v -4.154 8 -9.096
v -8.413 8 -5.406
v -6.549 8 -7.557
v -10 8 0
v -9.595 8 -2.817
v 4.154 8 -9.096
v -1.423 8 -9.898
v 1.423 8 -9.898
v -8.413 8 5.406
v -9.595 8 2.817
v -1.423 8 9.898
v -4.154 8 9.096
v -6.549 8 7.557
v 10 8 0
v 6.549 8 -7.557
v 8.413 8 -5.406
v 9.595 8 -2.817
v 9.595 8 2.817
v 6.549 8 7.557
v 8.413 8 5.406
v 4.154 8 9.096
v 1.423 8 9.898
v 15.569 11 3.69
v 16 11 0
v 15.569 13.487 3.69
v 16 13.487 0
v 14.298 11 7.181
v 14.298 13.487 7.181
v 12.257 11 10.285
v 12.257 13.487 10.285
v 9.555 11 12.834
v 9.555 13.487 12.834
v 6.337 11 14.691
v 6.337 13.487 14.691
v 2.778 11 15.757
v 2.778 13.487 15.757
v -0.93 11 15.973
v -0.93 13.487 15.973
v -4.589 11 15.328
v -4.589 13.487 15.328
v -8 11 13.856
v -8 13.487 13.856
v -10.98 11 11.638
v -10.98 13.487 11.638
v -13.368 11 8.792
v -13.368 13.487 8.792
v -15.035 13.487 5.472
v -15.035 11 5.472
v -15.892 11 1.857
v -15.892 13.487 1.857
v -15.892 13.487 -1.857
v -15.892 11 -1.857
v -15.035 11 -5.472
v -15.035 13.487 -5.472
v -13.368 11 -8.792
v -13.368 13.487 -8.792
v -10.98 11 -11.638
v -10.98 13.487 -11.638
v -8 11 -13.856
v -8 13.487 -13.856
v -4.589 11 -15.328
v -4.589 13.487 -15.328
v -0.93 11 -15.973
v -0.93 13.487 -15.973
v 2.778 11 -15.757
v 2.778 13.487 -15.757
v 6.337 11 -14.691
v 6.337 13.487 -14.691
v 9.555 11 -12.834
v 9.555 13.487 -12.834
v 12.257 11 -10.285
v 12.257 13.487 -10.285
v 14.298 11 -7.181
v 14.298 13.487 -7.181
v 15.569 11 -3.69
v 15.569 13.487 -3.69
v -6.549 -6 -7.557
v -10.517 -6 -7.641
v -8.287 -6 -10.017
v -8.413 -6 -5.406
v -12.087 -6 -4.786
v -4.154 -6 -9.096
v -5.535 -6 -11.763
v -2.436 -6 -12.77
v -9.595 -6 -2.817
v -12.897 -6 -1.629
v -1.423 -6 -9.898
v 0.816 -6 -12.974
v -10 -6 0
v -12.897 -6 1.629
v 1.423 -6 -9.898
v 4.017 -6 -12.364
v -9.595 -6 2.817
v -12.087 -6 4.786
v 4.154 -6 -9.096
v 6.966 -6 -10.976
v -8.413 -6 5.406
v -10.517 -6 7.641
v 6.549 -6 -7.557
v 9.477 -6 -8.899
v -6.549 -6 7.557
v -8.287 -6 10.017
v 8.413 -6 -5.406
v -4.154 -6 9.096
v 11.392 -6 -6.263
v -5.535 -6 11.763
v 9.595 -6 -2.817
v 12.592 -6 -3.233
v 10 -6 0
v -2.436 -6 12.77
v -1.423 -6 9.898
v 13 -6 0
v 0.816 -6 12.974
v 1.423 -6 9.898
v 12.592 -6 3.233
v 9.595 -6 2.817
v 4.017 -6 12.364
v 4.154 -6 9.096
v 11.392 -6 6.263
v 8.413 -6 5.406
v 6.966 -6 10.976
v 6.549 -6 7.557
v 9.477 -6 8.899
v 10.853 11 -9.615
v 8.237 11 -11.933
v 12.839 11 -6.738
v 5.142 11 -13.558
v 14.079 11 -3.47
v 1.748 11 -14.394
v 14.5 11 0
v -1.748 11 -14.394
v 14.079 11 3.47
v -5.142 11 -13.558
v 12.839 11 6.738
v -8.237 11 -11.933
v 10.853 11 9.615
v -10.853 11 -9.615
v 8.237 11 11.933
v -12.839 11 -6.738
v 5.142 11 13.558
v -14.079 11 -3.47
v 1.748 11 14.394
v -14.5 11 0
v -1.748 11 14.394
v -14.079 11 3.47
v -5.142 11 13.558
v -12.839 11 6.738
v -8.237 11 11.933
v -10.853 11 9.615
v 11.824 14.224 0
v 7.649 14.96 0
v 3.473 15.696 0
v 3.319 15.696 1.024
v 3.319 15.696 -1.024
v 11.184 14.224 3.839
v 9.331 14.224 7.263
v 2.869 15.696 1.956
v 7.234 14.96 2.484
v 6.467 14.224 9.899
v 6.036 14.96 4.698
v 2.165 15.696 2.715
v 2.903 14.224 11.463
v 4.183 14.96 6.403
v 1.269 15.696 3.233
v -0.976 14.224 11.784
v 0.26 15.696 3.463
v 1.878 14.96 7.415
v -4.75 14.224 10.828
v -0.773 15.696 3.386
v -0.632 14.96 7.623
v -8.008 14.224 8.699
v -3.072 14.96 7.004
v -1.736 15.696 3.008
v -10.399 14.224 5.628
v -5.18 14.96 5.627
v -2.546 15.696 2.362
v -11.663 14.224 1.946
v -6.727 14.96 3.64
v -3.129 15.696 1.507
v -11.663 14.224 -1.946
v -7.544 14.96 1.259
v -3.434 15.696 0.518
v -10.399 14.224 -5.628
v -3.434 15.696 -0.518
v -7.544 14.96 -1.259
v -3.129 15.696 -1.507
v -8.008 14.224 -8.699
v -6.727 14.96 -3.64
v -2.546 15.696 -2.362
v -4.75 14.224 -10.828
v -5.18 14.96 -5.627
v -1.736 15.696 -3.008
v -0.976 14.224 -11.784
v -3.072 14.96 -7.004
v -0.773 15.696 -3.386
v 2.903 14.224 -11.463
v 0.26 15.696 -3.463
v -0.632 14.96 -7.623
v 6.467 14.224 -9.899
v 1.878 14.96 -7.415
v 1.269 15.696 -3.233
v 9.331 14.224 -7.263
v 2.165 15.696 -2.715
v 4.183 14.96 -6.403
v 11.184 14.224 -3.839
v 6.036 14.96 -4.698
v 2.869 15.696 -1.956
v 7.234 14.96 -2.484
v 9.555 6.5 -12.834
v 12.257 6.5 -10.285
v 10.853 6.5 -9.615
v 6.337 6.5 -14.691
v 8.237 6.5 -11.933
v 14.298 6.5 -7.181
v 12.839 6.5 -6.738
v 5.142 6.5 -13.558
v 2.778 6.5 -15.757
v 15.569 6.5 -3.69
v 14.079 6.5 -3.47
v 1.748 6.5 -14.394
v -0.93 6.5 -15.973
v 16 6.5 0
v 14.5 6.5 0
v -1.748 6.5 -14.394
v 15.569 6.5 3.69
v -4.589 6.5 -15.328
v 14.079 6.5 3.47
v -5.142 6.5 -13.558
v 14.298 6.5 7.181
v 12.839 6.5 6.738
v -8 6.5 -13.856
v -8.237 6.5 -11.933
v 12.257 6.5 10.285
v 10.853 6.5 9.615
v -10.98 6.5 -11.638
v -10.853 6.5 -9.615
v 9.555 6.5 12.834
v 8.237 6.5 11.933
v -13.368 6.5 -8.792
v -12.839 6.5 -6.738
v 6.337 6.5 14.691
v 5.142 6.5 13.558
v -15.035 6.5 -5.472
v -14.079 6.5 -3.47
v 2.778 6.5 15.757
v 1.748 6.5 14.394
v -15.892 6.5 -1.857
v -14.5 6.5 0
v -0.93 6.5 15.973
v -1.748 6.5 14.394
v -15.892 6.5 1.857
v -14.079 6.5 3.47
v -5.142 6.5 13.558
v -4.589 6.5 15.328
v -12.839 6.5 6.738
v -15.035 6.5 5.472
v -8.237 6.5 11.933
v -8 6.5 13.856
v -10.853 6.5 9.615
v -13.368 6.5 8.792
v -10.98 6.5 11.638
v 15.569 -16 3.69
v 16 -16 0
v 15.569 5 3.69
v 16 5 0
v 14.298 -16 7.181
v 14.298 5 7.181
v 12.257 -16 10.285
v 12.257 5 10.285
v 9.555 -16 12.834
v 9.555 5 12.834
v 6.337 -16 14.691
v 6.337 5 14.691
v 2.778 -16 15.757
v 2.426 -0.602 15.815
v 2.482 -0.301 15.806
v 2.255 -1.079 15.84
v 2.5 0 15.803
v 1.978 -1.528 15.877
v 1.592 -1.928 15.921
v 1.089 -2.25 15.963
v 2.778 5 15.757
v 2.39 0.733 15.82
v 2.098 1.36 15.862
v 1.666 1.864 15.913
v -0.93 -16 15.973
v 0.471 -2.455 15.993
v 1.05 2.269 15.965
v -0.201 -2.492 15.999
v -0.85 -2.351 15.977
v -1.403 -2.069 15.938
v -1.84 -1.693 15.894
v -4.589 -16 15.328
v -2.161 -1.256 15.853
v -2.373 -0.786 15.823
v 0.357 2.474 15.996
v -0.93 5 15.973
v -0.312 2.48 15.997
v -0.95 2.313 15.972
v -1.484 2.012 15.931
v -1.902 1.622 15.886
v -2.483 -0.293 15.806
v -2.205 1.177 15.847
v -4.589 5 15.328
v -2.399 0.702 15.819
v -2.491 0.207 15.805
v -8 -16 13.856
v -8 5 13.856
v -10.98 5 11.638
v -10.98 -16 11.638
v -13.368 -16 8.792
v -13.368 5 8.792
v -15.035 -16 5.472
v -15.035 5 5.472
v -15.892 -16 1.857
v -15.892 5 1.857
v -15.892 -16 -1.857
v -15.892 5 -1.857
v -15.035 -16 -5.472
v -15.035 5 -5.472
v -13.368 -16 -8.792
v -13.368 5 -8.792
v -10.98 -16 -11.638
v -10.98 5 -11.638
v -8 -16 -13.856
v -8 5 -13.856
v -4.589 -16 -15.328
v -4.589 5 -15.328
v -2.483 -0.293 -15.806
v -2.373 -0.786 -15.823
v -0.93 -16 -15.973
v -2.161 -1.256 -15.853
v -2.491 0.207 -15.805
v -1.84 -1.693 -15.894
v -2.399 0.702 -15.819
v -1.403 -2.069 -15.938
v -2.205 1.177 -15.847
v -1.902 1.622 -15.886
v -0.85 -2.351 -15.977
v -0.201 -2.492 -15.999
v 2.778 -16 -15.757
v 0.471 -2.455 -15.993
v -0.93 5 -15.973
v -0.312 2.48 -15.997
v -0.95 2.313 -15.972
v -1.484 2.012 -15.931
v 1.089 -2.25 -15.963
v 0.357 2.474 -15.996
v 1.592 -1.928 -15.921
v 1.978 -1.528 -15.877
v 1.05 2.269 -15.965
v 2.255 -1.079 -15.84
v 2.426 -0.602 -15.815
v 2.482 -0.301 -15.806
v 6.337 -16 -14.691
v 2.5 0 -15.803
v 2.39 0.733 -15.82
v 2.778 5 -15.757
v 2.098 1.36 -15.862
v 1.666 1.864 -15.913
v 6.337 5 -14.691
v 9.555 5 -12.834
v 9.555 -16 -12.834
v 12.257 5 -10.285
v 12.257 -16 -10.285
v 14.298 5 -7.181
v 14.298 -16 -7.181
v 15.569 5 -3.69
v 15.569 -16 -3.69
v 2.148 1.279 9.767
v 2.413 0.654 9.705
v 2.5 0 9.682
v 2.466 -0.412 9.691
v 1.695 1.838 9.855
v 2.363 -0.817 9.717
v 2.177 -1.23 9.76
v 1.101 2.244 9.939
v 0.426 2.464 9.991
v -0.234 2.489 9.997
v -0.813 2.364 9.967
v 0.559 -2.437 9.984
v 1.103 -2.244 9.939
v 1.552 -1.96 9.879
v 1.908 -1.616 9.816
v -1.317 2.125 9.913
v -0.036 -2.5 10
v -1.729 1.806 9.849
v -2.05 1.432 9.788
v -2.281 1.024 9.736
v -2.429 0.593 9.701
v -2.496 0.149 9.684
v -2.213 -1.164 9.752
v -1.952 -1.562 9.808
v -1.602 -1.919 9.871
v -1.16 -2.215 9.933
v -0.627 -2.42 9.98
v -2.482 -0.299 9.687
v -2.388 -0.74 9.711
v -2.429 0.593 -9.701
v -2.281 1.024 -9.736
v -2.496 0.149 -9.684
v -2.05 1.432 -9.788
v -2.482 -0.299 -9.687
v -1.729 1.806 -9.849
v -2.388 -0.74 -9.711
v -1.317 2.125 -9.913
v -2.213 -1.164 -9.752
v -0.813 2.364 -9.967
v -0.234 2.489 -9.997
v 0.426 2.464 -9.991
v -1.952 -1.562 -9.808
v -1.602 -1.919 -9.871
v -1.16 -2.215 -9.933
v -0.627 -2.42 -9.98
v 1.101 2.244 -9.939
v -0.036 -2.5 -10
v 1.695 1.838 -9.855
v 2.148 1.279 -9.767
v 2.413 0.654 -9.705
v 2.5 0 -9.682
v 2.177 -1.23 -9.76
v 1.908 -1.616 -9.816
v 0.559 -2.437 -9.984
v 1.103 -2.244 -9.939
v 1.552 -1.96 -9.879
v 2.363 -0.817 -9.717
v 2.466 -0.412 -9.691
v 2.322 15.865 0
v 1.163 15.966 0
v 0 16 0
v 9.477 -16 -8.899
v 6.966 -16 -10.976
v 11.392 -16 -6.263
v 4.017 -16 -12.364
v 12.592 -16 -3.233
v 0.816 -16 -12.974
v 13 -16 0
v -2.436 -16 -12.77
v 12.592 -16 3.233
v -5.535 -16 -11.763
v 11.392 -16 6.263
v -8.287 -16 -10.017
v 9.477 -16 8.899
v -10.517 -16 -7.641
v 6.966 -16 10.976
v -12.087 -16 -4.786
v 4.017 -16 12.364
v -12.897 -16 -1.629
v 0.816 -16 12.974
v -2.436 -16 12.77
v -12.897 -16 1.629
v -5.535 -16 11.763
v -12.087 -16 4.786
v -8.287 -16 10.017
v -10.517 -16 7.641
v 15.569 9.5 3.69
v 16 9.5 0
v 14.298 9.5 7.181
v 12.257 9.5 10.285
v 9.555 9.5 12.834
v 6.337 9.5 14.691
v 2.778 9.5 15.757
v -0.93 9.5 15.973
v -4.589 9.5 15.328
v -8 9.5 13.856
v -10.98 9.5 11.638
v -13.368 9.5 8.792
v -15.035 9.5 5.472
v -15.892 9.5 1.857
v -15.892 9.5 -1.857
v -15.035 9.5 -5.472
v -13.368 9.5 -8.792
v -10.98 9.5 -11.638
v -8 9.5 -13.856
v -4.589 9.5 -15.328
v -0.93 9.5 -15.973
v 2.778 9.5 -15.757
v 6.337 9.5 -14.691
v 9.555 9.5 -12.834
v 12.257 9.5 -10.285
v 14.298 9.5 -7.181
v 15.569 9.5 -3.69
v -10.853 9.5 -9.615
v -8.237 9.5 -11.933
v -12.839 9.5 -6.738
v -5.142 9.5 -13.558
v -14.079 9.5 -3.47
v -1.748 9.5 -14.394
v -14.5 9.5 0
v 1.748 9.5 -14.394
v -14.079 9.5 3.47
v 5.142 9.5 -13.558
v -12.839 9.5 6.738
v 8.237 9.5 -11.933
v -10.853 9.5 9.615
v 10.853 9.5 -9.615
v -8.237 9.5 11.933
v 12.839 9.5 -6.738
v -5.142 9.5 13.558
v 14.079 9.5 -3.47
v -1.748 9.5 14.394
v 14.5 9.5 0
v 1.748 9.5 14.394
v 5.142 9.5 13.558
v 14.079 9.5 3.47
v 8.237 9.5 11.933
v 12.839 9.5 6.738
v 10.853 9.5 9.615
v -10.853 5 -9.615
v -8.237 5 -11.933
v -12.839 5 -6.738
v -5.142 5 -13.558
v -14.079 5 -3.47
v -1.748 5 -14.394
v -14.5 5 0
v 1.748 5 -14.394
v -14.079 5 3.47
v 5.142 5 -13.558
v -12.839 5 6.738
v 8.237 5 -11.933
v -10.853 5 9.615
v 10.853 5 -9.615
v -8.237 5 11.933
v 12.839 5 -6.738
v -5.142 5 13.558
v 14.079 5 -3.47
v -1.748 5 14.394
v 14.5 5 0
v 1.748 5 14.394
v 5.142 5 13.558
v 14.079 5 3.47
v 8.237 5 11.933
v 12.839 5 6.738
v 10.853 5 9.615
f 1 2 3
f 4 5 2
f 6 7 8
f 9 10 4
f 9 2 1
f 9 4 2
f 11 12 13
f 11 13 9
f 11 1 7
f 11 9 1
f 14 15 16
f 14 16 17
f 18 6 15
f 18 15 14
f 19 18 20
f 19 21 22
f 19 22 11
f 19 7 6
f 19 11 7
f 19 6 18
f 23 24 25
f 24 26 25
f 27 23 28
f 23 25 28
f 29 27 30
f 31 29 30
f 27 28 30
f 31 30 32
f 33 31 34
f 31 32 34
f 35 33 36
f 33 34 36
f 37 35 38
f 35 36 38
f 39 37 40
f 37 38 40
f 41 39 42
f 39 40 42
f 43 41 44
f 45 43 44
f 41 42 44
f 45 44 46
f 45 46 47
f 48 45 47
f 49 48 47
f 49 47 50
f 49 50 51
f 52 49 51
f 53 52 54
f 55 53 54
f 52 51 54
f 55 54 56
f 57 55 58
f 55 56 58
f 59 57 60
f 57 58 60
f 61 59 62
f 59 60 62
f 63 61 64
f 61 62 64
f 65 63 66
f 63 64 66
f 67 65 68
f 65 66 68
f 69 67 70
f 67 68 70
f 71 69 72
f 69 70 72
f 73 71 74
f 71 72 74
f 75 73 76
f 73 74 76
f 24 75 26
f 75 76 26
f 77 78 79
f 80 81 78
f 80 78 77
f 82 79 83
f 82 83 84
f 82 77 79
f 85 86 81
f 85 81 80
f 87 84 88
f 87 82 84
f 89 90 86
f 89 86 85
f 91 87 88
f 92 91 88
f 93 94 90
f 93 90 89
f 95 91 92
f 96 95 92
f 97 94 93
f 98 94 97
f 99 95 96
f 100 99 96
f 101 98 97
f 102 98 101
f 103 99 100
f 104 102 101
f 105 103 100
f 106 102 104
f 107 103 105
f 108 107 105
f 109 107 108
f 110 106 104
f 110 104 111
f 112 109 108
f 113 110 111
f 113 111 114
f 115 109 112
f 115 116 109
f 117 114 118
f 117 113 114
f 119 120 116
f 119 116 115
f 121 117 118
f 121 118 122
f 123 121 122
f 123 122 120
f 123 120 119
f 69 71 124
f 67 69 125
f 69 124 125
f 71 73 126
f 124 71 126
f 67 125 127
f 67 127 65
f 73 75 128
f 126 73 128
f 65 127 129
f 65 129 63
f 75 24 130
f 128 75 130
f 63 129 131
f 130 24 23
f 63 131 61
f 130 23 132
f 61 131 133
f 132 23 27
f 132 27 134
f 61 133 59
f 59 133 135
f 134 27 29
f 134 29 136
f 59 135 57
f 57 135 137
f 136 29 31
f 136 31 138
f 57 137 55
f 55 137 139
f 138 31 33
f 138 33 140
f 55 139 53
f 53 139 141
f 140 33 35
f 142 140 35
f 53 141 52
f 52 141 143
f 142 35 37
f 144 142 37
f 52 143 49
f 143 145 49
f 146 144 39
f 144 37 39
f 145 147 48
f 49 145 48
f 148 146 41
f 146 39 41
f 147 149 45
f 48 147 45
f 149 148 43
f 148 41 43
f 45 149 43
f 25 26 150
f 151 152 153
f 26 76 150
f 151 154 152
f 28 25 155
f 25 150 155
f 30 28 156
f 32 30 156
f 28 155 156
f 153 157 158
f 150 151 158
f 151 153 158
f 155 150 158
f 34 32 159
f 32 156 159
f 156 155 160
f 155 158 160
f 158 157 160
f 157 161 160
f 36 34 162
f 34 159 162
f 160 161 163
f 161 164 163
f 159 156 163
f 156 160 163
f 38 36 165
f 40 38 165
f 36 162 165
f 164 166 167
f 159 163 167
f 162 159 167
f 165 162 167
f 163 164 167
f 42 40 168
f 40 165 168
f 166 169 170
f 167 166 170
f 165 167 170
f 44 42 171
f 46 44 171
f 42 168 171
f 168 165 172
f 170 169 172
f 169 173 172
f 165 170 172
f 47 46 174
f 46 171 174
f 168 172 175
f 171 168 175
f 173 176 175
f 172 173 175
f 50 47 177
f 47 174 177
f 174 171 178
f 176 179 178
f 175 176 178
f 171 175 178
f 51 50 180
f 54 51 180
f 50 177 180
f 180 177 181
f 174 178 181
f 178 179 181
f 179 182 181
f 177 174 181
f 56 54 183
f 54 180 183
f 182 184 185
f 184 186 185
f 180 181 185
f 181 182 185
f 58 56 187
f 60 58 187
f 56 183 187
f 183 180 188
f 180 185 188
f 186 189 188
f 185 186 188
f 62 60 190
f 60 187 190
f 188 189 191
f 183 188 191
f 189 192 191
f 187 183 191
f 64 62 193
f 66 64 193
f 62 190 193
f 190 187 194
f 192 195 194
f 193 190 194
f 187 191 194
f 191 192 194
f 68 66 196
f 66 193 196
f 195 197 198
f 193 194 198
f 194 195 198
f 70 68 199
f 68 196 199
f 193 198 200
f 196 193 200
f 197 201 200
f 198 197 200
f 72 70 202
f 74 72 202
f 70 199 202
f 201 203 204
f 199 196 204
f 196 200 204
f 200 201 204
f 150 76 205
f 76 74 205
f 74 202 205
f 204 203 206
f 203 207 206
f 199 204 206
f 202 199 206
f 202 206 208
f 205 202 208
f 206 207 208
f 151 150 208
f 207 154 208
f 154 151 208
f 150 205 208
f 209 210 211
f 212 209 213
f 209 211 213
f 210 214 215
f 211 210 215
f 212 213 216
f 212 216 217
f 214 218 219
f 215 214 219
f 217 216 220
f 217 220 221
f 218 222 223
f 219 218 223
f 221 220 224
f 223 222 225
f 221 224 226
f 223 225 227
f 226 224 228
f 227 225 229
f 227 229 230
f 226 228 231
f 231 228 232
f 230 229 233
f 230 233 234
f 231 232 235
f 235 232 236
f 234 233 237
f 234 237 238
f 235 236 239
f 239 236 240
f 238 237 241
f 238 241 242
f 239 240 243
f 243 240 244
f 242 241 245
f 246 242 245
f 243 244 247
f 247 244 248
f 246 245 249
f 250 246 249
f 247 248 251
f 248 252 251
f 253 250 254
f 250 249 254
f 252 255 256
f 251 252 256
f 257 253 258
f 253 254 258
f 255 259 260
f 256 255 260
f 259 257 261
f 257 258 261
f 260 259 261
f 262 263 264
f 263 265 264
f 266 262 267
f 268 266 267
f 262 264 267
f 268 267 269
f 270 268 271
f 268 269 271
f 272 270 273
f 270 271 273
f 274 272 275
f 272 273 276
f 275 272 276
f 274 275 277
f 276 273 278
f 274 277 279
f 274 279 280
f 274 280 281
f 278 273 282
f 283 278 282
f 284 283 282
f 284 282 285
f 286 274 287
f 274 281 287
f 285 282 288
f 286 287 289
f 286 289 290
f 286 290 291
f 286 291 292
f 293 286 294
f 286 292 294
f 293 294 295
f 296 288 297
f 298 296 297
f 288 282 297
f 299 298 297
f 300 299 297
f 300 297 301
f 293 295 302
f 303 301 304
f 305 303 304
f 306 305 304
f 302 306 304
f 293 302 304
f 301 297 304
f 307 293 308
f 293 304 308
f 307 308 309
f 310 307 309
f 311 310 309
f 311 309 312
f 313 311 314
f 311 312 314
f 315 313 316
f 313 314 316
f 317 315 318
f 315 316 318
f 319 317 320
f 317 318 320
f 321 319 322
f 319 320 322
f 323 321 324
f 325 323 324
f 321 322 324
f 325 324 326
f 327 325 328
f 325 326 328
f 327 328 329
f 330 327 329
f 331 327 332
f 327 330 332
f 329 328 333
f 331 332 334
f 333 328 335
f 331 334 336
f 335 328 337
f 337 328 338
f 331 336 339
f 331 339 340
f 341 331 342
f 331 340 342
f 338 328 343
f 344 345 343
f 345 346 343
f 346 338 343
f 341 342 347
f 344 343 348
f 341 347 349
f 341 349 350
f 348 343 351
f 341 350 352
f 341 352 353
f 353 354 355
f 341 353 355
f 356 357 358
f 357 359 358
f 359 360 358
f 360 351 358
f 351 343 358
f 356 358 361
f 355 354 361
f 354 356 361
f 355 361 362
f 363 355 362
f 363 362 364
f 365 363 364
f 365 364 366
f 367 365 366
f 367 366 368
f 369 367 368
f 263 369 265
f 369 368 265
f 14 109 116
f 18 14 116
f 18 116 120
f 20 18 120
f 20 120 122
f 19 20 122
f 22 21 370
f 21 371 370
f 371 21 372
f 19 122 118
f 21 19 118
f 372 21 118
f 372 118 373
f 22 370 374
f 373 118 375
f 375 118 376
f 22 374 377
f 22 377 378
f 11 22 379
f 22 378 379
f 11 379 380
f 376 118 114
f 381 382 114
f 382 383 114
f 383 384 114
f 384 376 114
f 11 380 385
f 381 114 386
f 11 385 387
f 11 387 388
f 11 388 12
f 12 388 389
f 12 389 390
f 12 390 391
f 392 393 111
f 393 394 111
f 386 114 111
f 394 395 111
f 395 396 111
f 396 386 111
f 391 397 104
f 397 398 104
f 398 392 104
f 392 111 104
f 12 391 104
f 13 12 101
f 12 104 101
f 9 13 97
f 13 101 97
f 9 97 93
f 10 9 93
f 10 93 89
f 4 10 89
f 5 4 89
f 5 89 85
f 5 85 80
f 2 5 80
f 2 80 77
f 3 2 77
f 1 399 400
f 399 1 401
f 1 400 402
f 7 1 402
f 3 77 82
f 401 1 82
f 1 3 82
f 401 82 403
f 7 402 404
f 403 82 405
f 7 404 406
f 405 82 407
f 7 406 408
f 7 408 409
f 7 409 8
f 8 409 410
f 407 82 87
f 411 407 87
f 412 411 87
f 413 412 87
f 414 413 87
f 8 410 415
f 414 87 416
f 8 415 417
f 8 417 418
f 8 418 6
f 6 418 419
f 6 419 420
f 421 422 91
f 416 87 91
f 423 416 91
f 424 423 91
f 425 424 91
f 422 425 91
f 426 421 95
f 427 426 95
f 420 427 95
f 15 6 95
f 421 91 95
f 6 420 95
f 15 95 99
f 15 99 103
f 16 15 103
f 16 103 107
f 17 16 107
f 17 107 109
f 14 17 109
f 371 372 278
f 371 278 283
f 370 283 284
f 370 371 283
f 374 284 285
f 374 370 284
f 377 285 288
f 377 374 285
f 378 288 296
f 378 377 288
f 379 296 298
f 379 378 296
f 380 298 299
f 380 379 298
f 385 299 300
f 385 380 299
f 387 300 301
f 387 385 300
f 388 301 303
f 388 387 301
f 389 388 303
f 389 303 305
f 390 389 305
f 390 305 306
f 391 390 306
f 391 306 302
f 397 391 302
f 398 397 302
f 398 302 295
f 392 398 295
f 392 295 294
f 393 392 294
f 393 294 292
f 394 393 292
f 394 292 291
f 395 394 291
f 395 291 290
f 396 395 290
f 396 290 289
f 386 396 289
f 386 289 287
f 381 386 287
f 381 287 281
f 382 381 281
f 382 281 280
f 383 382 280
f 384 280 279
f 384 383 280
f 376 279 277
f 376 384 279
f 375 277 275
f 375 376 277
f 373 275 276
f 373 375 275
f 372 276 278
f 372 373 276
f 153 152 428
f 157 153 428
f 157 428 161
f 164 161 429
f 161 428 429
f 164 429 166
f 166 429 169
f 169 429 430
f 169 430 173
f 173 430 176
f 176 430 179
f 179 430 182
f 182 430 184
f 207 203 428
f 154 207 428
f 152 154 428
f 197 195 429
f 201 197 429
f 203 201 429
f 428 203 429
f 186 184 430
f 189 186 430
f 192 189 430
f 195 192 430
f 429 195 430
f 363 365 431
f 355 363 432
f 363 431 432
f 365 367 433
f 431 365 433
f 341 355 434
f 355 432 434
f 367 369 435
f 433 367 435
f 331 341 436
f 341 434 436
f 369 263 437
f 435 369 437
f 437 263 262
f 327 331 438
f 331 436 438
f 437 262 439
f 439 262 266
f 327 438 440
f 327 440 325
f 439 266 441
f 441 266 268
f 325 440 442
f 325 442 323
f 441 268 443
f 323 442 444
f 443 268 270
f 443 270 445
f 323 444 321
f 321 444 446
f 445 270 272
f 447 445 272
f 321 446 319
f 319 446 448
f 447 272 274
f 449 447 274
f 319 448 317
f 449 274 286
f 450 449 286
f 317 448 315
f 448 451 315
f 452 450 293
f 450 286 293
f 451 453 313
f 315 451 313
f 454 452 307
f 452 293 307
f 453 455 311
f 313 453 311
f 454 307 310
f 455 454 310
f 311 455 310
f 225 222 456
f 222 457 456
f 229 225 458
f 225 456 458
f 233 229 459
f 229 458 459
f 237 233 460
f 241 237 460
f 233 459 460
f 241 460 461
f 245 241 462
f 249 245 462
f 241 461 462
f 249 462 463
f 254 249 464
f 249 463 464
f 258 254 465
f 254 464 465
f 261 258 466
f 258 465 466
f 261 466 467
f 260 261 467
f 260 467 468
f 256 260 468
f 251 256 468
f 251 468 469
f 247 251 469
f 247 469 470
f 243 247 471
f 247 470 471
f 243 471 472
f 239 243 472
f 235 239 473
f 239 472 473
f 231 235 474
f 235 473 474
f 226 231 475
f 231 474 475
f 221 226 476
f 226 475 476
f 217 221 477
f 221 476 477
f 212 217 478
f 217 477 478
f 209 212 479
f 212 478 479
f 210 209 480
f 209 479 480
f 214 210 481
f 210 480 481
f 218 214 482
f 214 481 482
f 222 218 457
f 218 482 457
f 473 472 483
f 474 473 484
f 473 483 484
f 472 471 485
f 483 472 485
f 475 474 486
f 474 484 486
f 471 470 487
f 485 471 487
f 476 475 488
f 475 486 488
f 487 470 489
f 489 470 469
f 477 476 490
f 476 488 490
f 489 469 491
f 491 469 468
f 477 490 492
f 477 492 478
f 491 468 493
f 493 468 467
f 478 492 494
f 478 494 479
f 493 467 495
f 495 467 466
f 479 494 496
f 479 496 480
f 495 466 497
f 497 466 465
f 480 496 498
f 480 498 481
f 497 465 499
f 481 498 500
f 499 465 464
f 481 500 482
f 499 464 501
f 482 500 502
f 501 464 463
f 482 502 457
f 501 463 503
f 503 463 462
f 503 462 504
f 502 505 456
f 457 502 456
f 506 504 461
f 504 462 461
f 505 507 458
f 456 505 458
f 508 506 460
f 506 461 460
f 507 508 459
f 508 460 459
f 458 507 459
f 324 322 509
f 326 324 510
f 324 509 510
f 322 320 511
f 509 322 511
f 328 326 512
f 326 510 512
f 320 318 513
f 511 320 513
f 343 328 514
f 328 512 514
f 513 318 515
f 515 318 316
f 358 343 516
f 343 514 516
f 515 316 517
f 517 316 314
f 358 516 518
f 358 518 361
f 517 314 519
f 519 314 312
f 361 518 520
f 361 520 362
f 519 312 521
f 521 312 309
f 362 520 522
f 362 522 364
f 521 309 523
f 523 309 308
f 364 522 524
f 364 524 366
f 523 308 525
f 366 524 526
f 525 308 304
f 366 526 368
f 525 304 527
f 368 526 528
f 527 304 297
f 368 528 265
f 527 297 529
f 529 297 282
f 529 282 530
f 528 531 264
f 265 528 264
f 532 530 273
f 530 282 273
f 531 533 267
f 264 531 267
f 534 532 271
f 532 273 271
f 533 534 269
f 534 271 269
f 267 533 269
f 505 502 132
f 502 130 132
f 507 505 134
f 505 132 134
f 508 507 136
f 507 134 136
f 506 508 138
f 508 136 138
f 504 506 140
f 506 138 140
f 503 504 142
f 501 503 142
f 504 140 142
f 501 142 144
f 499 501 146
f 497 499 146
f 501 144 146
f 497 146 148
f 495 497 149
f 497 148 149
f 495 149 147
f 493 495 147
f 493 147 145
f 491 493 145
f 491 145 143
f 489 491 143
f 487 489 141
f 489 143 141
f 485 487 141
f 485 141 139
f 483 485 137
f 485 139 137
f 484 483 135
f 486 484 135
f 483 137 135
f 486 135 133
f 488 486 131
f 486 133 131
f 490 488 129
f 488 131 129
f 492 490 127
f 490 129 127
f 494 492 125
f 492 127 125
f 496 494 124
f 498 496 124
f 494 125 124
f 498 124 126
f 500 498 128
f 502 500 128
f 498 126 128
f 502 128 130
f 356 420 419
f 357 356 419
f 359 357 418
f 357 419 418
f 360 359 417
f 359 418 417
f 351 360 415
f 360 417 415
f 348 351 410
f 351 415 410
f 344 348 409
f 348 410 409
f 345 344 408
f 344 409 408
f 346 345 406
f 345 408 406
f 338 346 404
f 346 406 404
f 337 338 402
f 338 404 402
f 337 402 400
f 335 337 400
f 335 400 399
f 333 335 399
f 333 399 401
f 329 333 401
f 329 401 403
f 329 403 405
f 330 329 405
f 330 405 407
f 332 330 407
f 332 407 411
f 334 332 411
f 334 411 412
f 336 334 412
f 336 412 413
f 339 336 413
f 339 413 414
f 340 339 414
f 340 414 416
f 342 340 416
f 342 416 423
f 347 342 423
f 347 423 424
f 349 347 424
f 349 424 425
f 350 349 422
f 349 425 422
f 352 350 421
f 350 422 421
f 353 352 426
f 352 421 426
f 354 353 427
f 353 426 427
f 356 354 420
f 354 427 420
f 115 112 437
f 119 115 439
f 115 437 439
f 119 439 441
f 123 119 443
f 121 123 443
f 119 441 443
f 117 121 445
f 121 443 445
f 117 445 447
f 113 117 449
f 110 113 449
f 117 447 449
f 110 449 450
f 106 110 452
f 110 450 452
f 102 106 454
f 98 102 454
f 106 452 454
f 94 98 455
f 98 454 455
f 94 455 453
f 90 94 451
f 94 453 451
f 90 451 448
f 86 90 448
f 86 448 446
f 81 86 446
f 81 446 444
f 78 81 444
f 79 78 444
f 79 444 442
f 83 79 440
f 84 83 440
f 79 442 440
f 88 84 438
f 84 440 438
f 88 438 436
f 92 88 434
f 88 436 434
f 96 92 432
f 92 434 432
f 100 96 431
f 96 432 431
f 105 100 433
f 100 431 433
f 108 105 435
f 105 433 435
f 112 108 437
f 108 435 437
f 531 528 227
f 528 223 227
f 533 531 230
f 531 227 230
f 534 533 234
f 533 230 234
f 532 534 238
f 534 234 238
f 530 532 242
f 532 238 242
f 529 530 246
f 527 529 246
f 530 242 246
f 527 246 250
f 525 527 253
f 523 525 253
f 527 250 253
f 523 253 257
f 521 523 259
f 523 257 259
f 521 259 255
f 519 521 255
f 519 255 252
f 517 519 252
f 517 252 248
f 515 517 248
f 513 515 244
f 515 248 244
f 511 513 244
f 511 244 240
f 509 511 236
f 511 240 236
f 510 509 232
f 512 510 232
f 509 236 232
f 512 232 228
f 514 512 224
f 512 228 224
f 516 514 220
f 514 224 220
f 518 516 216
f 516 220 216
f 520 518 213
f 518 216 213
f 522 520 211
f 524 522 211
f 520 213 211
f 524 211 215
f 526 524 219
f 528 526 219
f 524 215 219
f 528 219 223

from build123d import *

# Parameters (mm, degrees)
SKETCH2_R               = 2.5
CUT_EXTRUDE1_DEPTH      = 17
CUT_EXTRUDE1_DEPTH_BACK = 17
SKETCH3_R               = 10
CUT_EXTRUDE2_DEPTH      = 24
SKETCH4_R               = 13
CUT_EXTRUDE3_DEPTH      = 10


with BuildPart() as part:
    # Sketch1 → Revolve1 (revolve)
    with BuildSketch(Plane.XY):
        with BuildLine():
            Line((0, 16), (0, -16))
            Line((0, -16), (16, -16))
            Line((16, -16), (16, 5))
            Line((16, 5), (14.5, 5))
            Line((14.5, 5), (14.5, 6.5))
            Line((14.5, 6.5), (16, 6.5))
            Line((16, 6.5), (16, 9.5))
            Line((16, 9.5), (14.5, 9.5))
            Line((14.5, 9.5), (14.5, 11))
            Line((14.5, 11), (16, 11))
            Line((16, 11), (16, 13.487300546))
            Line((16, 13.487300546), (3.472963553, 15.69615506))
            ThreePointArc((3.472963553, 15.69615506), (1.743114855, 15.923893962), (0, 16))
        make_face()
    revolve(axis=Axis((0, 16, 0), (0, -1, 0)))

    # Sketch2 → Cut-Extrude1 (cut, two sides)
    with BuildSketch(Plane.XY) as cut_extrude1_sk:
        Circle(SKETCH2_R)
    extrude(amount=CUT_EXTRUDE1_DEPTH, mode=Mode.SUBTRACT)
    extrude(cut_extrude1_sk.sketch, amount=-CUT_EXTRUDE1_DEPTH_BACK, mode=Mode.SUBTRACT)

    # Sketch3 → Cut-Extrude2 (cut)
    with BuildSketch(Plane.XZ.offset(16)):
        Circle(SKETCH3_R)
    extrude(amount=-CUT_EXTRUDE2_DEPTH, mode=Mode.SUBTRACT)

    # Sketch4 → Cut-Extrude3 (cut)
    with BuildSketch(Plane.XZ.offset(16)):
        Circle(SKETCH4_R)
    extrude(amount=-CUT_EXTRUDE3_DEPTH, mode=Mode.SUBTRACT)


solid = part.part
